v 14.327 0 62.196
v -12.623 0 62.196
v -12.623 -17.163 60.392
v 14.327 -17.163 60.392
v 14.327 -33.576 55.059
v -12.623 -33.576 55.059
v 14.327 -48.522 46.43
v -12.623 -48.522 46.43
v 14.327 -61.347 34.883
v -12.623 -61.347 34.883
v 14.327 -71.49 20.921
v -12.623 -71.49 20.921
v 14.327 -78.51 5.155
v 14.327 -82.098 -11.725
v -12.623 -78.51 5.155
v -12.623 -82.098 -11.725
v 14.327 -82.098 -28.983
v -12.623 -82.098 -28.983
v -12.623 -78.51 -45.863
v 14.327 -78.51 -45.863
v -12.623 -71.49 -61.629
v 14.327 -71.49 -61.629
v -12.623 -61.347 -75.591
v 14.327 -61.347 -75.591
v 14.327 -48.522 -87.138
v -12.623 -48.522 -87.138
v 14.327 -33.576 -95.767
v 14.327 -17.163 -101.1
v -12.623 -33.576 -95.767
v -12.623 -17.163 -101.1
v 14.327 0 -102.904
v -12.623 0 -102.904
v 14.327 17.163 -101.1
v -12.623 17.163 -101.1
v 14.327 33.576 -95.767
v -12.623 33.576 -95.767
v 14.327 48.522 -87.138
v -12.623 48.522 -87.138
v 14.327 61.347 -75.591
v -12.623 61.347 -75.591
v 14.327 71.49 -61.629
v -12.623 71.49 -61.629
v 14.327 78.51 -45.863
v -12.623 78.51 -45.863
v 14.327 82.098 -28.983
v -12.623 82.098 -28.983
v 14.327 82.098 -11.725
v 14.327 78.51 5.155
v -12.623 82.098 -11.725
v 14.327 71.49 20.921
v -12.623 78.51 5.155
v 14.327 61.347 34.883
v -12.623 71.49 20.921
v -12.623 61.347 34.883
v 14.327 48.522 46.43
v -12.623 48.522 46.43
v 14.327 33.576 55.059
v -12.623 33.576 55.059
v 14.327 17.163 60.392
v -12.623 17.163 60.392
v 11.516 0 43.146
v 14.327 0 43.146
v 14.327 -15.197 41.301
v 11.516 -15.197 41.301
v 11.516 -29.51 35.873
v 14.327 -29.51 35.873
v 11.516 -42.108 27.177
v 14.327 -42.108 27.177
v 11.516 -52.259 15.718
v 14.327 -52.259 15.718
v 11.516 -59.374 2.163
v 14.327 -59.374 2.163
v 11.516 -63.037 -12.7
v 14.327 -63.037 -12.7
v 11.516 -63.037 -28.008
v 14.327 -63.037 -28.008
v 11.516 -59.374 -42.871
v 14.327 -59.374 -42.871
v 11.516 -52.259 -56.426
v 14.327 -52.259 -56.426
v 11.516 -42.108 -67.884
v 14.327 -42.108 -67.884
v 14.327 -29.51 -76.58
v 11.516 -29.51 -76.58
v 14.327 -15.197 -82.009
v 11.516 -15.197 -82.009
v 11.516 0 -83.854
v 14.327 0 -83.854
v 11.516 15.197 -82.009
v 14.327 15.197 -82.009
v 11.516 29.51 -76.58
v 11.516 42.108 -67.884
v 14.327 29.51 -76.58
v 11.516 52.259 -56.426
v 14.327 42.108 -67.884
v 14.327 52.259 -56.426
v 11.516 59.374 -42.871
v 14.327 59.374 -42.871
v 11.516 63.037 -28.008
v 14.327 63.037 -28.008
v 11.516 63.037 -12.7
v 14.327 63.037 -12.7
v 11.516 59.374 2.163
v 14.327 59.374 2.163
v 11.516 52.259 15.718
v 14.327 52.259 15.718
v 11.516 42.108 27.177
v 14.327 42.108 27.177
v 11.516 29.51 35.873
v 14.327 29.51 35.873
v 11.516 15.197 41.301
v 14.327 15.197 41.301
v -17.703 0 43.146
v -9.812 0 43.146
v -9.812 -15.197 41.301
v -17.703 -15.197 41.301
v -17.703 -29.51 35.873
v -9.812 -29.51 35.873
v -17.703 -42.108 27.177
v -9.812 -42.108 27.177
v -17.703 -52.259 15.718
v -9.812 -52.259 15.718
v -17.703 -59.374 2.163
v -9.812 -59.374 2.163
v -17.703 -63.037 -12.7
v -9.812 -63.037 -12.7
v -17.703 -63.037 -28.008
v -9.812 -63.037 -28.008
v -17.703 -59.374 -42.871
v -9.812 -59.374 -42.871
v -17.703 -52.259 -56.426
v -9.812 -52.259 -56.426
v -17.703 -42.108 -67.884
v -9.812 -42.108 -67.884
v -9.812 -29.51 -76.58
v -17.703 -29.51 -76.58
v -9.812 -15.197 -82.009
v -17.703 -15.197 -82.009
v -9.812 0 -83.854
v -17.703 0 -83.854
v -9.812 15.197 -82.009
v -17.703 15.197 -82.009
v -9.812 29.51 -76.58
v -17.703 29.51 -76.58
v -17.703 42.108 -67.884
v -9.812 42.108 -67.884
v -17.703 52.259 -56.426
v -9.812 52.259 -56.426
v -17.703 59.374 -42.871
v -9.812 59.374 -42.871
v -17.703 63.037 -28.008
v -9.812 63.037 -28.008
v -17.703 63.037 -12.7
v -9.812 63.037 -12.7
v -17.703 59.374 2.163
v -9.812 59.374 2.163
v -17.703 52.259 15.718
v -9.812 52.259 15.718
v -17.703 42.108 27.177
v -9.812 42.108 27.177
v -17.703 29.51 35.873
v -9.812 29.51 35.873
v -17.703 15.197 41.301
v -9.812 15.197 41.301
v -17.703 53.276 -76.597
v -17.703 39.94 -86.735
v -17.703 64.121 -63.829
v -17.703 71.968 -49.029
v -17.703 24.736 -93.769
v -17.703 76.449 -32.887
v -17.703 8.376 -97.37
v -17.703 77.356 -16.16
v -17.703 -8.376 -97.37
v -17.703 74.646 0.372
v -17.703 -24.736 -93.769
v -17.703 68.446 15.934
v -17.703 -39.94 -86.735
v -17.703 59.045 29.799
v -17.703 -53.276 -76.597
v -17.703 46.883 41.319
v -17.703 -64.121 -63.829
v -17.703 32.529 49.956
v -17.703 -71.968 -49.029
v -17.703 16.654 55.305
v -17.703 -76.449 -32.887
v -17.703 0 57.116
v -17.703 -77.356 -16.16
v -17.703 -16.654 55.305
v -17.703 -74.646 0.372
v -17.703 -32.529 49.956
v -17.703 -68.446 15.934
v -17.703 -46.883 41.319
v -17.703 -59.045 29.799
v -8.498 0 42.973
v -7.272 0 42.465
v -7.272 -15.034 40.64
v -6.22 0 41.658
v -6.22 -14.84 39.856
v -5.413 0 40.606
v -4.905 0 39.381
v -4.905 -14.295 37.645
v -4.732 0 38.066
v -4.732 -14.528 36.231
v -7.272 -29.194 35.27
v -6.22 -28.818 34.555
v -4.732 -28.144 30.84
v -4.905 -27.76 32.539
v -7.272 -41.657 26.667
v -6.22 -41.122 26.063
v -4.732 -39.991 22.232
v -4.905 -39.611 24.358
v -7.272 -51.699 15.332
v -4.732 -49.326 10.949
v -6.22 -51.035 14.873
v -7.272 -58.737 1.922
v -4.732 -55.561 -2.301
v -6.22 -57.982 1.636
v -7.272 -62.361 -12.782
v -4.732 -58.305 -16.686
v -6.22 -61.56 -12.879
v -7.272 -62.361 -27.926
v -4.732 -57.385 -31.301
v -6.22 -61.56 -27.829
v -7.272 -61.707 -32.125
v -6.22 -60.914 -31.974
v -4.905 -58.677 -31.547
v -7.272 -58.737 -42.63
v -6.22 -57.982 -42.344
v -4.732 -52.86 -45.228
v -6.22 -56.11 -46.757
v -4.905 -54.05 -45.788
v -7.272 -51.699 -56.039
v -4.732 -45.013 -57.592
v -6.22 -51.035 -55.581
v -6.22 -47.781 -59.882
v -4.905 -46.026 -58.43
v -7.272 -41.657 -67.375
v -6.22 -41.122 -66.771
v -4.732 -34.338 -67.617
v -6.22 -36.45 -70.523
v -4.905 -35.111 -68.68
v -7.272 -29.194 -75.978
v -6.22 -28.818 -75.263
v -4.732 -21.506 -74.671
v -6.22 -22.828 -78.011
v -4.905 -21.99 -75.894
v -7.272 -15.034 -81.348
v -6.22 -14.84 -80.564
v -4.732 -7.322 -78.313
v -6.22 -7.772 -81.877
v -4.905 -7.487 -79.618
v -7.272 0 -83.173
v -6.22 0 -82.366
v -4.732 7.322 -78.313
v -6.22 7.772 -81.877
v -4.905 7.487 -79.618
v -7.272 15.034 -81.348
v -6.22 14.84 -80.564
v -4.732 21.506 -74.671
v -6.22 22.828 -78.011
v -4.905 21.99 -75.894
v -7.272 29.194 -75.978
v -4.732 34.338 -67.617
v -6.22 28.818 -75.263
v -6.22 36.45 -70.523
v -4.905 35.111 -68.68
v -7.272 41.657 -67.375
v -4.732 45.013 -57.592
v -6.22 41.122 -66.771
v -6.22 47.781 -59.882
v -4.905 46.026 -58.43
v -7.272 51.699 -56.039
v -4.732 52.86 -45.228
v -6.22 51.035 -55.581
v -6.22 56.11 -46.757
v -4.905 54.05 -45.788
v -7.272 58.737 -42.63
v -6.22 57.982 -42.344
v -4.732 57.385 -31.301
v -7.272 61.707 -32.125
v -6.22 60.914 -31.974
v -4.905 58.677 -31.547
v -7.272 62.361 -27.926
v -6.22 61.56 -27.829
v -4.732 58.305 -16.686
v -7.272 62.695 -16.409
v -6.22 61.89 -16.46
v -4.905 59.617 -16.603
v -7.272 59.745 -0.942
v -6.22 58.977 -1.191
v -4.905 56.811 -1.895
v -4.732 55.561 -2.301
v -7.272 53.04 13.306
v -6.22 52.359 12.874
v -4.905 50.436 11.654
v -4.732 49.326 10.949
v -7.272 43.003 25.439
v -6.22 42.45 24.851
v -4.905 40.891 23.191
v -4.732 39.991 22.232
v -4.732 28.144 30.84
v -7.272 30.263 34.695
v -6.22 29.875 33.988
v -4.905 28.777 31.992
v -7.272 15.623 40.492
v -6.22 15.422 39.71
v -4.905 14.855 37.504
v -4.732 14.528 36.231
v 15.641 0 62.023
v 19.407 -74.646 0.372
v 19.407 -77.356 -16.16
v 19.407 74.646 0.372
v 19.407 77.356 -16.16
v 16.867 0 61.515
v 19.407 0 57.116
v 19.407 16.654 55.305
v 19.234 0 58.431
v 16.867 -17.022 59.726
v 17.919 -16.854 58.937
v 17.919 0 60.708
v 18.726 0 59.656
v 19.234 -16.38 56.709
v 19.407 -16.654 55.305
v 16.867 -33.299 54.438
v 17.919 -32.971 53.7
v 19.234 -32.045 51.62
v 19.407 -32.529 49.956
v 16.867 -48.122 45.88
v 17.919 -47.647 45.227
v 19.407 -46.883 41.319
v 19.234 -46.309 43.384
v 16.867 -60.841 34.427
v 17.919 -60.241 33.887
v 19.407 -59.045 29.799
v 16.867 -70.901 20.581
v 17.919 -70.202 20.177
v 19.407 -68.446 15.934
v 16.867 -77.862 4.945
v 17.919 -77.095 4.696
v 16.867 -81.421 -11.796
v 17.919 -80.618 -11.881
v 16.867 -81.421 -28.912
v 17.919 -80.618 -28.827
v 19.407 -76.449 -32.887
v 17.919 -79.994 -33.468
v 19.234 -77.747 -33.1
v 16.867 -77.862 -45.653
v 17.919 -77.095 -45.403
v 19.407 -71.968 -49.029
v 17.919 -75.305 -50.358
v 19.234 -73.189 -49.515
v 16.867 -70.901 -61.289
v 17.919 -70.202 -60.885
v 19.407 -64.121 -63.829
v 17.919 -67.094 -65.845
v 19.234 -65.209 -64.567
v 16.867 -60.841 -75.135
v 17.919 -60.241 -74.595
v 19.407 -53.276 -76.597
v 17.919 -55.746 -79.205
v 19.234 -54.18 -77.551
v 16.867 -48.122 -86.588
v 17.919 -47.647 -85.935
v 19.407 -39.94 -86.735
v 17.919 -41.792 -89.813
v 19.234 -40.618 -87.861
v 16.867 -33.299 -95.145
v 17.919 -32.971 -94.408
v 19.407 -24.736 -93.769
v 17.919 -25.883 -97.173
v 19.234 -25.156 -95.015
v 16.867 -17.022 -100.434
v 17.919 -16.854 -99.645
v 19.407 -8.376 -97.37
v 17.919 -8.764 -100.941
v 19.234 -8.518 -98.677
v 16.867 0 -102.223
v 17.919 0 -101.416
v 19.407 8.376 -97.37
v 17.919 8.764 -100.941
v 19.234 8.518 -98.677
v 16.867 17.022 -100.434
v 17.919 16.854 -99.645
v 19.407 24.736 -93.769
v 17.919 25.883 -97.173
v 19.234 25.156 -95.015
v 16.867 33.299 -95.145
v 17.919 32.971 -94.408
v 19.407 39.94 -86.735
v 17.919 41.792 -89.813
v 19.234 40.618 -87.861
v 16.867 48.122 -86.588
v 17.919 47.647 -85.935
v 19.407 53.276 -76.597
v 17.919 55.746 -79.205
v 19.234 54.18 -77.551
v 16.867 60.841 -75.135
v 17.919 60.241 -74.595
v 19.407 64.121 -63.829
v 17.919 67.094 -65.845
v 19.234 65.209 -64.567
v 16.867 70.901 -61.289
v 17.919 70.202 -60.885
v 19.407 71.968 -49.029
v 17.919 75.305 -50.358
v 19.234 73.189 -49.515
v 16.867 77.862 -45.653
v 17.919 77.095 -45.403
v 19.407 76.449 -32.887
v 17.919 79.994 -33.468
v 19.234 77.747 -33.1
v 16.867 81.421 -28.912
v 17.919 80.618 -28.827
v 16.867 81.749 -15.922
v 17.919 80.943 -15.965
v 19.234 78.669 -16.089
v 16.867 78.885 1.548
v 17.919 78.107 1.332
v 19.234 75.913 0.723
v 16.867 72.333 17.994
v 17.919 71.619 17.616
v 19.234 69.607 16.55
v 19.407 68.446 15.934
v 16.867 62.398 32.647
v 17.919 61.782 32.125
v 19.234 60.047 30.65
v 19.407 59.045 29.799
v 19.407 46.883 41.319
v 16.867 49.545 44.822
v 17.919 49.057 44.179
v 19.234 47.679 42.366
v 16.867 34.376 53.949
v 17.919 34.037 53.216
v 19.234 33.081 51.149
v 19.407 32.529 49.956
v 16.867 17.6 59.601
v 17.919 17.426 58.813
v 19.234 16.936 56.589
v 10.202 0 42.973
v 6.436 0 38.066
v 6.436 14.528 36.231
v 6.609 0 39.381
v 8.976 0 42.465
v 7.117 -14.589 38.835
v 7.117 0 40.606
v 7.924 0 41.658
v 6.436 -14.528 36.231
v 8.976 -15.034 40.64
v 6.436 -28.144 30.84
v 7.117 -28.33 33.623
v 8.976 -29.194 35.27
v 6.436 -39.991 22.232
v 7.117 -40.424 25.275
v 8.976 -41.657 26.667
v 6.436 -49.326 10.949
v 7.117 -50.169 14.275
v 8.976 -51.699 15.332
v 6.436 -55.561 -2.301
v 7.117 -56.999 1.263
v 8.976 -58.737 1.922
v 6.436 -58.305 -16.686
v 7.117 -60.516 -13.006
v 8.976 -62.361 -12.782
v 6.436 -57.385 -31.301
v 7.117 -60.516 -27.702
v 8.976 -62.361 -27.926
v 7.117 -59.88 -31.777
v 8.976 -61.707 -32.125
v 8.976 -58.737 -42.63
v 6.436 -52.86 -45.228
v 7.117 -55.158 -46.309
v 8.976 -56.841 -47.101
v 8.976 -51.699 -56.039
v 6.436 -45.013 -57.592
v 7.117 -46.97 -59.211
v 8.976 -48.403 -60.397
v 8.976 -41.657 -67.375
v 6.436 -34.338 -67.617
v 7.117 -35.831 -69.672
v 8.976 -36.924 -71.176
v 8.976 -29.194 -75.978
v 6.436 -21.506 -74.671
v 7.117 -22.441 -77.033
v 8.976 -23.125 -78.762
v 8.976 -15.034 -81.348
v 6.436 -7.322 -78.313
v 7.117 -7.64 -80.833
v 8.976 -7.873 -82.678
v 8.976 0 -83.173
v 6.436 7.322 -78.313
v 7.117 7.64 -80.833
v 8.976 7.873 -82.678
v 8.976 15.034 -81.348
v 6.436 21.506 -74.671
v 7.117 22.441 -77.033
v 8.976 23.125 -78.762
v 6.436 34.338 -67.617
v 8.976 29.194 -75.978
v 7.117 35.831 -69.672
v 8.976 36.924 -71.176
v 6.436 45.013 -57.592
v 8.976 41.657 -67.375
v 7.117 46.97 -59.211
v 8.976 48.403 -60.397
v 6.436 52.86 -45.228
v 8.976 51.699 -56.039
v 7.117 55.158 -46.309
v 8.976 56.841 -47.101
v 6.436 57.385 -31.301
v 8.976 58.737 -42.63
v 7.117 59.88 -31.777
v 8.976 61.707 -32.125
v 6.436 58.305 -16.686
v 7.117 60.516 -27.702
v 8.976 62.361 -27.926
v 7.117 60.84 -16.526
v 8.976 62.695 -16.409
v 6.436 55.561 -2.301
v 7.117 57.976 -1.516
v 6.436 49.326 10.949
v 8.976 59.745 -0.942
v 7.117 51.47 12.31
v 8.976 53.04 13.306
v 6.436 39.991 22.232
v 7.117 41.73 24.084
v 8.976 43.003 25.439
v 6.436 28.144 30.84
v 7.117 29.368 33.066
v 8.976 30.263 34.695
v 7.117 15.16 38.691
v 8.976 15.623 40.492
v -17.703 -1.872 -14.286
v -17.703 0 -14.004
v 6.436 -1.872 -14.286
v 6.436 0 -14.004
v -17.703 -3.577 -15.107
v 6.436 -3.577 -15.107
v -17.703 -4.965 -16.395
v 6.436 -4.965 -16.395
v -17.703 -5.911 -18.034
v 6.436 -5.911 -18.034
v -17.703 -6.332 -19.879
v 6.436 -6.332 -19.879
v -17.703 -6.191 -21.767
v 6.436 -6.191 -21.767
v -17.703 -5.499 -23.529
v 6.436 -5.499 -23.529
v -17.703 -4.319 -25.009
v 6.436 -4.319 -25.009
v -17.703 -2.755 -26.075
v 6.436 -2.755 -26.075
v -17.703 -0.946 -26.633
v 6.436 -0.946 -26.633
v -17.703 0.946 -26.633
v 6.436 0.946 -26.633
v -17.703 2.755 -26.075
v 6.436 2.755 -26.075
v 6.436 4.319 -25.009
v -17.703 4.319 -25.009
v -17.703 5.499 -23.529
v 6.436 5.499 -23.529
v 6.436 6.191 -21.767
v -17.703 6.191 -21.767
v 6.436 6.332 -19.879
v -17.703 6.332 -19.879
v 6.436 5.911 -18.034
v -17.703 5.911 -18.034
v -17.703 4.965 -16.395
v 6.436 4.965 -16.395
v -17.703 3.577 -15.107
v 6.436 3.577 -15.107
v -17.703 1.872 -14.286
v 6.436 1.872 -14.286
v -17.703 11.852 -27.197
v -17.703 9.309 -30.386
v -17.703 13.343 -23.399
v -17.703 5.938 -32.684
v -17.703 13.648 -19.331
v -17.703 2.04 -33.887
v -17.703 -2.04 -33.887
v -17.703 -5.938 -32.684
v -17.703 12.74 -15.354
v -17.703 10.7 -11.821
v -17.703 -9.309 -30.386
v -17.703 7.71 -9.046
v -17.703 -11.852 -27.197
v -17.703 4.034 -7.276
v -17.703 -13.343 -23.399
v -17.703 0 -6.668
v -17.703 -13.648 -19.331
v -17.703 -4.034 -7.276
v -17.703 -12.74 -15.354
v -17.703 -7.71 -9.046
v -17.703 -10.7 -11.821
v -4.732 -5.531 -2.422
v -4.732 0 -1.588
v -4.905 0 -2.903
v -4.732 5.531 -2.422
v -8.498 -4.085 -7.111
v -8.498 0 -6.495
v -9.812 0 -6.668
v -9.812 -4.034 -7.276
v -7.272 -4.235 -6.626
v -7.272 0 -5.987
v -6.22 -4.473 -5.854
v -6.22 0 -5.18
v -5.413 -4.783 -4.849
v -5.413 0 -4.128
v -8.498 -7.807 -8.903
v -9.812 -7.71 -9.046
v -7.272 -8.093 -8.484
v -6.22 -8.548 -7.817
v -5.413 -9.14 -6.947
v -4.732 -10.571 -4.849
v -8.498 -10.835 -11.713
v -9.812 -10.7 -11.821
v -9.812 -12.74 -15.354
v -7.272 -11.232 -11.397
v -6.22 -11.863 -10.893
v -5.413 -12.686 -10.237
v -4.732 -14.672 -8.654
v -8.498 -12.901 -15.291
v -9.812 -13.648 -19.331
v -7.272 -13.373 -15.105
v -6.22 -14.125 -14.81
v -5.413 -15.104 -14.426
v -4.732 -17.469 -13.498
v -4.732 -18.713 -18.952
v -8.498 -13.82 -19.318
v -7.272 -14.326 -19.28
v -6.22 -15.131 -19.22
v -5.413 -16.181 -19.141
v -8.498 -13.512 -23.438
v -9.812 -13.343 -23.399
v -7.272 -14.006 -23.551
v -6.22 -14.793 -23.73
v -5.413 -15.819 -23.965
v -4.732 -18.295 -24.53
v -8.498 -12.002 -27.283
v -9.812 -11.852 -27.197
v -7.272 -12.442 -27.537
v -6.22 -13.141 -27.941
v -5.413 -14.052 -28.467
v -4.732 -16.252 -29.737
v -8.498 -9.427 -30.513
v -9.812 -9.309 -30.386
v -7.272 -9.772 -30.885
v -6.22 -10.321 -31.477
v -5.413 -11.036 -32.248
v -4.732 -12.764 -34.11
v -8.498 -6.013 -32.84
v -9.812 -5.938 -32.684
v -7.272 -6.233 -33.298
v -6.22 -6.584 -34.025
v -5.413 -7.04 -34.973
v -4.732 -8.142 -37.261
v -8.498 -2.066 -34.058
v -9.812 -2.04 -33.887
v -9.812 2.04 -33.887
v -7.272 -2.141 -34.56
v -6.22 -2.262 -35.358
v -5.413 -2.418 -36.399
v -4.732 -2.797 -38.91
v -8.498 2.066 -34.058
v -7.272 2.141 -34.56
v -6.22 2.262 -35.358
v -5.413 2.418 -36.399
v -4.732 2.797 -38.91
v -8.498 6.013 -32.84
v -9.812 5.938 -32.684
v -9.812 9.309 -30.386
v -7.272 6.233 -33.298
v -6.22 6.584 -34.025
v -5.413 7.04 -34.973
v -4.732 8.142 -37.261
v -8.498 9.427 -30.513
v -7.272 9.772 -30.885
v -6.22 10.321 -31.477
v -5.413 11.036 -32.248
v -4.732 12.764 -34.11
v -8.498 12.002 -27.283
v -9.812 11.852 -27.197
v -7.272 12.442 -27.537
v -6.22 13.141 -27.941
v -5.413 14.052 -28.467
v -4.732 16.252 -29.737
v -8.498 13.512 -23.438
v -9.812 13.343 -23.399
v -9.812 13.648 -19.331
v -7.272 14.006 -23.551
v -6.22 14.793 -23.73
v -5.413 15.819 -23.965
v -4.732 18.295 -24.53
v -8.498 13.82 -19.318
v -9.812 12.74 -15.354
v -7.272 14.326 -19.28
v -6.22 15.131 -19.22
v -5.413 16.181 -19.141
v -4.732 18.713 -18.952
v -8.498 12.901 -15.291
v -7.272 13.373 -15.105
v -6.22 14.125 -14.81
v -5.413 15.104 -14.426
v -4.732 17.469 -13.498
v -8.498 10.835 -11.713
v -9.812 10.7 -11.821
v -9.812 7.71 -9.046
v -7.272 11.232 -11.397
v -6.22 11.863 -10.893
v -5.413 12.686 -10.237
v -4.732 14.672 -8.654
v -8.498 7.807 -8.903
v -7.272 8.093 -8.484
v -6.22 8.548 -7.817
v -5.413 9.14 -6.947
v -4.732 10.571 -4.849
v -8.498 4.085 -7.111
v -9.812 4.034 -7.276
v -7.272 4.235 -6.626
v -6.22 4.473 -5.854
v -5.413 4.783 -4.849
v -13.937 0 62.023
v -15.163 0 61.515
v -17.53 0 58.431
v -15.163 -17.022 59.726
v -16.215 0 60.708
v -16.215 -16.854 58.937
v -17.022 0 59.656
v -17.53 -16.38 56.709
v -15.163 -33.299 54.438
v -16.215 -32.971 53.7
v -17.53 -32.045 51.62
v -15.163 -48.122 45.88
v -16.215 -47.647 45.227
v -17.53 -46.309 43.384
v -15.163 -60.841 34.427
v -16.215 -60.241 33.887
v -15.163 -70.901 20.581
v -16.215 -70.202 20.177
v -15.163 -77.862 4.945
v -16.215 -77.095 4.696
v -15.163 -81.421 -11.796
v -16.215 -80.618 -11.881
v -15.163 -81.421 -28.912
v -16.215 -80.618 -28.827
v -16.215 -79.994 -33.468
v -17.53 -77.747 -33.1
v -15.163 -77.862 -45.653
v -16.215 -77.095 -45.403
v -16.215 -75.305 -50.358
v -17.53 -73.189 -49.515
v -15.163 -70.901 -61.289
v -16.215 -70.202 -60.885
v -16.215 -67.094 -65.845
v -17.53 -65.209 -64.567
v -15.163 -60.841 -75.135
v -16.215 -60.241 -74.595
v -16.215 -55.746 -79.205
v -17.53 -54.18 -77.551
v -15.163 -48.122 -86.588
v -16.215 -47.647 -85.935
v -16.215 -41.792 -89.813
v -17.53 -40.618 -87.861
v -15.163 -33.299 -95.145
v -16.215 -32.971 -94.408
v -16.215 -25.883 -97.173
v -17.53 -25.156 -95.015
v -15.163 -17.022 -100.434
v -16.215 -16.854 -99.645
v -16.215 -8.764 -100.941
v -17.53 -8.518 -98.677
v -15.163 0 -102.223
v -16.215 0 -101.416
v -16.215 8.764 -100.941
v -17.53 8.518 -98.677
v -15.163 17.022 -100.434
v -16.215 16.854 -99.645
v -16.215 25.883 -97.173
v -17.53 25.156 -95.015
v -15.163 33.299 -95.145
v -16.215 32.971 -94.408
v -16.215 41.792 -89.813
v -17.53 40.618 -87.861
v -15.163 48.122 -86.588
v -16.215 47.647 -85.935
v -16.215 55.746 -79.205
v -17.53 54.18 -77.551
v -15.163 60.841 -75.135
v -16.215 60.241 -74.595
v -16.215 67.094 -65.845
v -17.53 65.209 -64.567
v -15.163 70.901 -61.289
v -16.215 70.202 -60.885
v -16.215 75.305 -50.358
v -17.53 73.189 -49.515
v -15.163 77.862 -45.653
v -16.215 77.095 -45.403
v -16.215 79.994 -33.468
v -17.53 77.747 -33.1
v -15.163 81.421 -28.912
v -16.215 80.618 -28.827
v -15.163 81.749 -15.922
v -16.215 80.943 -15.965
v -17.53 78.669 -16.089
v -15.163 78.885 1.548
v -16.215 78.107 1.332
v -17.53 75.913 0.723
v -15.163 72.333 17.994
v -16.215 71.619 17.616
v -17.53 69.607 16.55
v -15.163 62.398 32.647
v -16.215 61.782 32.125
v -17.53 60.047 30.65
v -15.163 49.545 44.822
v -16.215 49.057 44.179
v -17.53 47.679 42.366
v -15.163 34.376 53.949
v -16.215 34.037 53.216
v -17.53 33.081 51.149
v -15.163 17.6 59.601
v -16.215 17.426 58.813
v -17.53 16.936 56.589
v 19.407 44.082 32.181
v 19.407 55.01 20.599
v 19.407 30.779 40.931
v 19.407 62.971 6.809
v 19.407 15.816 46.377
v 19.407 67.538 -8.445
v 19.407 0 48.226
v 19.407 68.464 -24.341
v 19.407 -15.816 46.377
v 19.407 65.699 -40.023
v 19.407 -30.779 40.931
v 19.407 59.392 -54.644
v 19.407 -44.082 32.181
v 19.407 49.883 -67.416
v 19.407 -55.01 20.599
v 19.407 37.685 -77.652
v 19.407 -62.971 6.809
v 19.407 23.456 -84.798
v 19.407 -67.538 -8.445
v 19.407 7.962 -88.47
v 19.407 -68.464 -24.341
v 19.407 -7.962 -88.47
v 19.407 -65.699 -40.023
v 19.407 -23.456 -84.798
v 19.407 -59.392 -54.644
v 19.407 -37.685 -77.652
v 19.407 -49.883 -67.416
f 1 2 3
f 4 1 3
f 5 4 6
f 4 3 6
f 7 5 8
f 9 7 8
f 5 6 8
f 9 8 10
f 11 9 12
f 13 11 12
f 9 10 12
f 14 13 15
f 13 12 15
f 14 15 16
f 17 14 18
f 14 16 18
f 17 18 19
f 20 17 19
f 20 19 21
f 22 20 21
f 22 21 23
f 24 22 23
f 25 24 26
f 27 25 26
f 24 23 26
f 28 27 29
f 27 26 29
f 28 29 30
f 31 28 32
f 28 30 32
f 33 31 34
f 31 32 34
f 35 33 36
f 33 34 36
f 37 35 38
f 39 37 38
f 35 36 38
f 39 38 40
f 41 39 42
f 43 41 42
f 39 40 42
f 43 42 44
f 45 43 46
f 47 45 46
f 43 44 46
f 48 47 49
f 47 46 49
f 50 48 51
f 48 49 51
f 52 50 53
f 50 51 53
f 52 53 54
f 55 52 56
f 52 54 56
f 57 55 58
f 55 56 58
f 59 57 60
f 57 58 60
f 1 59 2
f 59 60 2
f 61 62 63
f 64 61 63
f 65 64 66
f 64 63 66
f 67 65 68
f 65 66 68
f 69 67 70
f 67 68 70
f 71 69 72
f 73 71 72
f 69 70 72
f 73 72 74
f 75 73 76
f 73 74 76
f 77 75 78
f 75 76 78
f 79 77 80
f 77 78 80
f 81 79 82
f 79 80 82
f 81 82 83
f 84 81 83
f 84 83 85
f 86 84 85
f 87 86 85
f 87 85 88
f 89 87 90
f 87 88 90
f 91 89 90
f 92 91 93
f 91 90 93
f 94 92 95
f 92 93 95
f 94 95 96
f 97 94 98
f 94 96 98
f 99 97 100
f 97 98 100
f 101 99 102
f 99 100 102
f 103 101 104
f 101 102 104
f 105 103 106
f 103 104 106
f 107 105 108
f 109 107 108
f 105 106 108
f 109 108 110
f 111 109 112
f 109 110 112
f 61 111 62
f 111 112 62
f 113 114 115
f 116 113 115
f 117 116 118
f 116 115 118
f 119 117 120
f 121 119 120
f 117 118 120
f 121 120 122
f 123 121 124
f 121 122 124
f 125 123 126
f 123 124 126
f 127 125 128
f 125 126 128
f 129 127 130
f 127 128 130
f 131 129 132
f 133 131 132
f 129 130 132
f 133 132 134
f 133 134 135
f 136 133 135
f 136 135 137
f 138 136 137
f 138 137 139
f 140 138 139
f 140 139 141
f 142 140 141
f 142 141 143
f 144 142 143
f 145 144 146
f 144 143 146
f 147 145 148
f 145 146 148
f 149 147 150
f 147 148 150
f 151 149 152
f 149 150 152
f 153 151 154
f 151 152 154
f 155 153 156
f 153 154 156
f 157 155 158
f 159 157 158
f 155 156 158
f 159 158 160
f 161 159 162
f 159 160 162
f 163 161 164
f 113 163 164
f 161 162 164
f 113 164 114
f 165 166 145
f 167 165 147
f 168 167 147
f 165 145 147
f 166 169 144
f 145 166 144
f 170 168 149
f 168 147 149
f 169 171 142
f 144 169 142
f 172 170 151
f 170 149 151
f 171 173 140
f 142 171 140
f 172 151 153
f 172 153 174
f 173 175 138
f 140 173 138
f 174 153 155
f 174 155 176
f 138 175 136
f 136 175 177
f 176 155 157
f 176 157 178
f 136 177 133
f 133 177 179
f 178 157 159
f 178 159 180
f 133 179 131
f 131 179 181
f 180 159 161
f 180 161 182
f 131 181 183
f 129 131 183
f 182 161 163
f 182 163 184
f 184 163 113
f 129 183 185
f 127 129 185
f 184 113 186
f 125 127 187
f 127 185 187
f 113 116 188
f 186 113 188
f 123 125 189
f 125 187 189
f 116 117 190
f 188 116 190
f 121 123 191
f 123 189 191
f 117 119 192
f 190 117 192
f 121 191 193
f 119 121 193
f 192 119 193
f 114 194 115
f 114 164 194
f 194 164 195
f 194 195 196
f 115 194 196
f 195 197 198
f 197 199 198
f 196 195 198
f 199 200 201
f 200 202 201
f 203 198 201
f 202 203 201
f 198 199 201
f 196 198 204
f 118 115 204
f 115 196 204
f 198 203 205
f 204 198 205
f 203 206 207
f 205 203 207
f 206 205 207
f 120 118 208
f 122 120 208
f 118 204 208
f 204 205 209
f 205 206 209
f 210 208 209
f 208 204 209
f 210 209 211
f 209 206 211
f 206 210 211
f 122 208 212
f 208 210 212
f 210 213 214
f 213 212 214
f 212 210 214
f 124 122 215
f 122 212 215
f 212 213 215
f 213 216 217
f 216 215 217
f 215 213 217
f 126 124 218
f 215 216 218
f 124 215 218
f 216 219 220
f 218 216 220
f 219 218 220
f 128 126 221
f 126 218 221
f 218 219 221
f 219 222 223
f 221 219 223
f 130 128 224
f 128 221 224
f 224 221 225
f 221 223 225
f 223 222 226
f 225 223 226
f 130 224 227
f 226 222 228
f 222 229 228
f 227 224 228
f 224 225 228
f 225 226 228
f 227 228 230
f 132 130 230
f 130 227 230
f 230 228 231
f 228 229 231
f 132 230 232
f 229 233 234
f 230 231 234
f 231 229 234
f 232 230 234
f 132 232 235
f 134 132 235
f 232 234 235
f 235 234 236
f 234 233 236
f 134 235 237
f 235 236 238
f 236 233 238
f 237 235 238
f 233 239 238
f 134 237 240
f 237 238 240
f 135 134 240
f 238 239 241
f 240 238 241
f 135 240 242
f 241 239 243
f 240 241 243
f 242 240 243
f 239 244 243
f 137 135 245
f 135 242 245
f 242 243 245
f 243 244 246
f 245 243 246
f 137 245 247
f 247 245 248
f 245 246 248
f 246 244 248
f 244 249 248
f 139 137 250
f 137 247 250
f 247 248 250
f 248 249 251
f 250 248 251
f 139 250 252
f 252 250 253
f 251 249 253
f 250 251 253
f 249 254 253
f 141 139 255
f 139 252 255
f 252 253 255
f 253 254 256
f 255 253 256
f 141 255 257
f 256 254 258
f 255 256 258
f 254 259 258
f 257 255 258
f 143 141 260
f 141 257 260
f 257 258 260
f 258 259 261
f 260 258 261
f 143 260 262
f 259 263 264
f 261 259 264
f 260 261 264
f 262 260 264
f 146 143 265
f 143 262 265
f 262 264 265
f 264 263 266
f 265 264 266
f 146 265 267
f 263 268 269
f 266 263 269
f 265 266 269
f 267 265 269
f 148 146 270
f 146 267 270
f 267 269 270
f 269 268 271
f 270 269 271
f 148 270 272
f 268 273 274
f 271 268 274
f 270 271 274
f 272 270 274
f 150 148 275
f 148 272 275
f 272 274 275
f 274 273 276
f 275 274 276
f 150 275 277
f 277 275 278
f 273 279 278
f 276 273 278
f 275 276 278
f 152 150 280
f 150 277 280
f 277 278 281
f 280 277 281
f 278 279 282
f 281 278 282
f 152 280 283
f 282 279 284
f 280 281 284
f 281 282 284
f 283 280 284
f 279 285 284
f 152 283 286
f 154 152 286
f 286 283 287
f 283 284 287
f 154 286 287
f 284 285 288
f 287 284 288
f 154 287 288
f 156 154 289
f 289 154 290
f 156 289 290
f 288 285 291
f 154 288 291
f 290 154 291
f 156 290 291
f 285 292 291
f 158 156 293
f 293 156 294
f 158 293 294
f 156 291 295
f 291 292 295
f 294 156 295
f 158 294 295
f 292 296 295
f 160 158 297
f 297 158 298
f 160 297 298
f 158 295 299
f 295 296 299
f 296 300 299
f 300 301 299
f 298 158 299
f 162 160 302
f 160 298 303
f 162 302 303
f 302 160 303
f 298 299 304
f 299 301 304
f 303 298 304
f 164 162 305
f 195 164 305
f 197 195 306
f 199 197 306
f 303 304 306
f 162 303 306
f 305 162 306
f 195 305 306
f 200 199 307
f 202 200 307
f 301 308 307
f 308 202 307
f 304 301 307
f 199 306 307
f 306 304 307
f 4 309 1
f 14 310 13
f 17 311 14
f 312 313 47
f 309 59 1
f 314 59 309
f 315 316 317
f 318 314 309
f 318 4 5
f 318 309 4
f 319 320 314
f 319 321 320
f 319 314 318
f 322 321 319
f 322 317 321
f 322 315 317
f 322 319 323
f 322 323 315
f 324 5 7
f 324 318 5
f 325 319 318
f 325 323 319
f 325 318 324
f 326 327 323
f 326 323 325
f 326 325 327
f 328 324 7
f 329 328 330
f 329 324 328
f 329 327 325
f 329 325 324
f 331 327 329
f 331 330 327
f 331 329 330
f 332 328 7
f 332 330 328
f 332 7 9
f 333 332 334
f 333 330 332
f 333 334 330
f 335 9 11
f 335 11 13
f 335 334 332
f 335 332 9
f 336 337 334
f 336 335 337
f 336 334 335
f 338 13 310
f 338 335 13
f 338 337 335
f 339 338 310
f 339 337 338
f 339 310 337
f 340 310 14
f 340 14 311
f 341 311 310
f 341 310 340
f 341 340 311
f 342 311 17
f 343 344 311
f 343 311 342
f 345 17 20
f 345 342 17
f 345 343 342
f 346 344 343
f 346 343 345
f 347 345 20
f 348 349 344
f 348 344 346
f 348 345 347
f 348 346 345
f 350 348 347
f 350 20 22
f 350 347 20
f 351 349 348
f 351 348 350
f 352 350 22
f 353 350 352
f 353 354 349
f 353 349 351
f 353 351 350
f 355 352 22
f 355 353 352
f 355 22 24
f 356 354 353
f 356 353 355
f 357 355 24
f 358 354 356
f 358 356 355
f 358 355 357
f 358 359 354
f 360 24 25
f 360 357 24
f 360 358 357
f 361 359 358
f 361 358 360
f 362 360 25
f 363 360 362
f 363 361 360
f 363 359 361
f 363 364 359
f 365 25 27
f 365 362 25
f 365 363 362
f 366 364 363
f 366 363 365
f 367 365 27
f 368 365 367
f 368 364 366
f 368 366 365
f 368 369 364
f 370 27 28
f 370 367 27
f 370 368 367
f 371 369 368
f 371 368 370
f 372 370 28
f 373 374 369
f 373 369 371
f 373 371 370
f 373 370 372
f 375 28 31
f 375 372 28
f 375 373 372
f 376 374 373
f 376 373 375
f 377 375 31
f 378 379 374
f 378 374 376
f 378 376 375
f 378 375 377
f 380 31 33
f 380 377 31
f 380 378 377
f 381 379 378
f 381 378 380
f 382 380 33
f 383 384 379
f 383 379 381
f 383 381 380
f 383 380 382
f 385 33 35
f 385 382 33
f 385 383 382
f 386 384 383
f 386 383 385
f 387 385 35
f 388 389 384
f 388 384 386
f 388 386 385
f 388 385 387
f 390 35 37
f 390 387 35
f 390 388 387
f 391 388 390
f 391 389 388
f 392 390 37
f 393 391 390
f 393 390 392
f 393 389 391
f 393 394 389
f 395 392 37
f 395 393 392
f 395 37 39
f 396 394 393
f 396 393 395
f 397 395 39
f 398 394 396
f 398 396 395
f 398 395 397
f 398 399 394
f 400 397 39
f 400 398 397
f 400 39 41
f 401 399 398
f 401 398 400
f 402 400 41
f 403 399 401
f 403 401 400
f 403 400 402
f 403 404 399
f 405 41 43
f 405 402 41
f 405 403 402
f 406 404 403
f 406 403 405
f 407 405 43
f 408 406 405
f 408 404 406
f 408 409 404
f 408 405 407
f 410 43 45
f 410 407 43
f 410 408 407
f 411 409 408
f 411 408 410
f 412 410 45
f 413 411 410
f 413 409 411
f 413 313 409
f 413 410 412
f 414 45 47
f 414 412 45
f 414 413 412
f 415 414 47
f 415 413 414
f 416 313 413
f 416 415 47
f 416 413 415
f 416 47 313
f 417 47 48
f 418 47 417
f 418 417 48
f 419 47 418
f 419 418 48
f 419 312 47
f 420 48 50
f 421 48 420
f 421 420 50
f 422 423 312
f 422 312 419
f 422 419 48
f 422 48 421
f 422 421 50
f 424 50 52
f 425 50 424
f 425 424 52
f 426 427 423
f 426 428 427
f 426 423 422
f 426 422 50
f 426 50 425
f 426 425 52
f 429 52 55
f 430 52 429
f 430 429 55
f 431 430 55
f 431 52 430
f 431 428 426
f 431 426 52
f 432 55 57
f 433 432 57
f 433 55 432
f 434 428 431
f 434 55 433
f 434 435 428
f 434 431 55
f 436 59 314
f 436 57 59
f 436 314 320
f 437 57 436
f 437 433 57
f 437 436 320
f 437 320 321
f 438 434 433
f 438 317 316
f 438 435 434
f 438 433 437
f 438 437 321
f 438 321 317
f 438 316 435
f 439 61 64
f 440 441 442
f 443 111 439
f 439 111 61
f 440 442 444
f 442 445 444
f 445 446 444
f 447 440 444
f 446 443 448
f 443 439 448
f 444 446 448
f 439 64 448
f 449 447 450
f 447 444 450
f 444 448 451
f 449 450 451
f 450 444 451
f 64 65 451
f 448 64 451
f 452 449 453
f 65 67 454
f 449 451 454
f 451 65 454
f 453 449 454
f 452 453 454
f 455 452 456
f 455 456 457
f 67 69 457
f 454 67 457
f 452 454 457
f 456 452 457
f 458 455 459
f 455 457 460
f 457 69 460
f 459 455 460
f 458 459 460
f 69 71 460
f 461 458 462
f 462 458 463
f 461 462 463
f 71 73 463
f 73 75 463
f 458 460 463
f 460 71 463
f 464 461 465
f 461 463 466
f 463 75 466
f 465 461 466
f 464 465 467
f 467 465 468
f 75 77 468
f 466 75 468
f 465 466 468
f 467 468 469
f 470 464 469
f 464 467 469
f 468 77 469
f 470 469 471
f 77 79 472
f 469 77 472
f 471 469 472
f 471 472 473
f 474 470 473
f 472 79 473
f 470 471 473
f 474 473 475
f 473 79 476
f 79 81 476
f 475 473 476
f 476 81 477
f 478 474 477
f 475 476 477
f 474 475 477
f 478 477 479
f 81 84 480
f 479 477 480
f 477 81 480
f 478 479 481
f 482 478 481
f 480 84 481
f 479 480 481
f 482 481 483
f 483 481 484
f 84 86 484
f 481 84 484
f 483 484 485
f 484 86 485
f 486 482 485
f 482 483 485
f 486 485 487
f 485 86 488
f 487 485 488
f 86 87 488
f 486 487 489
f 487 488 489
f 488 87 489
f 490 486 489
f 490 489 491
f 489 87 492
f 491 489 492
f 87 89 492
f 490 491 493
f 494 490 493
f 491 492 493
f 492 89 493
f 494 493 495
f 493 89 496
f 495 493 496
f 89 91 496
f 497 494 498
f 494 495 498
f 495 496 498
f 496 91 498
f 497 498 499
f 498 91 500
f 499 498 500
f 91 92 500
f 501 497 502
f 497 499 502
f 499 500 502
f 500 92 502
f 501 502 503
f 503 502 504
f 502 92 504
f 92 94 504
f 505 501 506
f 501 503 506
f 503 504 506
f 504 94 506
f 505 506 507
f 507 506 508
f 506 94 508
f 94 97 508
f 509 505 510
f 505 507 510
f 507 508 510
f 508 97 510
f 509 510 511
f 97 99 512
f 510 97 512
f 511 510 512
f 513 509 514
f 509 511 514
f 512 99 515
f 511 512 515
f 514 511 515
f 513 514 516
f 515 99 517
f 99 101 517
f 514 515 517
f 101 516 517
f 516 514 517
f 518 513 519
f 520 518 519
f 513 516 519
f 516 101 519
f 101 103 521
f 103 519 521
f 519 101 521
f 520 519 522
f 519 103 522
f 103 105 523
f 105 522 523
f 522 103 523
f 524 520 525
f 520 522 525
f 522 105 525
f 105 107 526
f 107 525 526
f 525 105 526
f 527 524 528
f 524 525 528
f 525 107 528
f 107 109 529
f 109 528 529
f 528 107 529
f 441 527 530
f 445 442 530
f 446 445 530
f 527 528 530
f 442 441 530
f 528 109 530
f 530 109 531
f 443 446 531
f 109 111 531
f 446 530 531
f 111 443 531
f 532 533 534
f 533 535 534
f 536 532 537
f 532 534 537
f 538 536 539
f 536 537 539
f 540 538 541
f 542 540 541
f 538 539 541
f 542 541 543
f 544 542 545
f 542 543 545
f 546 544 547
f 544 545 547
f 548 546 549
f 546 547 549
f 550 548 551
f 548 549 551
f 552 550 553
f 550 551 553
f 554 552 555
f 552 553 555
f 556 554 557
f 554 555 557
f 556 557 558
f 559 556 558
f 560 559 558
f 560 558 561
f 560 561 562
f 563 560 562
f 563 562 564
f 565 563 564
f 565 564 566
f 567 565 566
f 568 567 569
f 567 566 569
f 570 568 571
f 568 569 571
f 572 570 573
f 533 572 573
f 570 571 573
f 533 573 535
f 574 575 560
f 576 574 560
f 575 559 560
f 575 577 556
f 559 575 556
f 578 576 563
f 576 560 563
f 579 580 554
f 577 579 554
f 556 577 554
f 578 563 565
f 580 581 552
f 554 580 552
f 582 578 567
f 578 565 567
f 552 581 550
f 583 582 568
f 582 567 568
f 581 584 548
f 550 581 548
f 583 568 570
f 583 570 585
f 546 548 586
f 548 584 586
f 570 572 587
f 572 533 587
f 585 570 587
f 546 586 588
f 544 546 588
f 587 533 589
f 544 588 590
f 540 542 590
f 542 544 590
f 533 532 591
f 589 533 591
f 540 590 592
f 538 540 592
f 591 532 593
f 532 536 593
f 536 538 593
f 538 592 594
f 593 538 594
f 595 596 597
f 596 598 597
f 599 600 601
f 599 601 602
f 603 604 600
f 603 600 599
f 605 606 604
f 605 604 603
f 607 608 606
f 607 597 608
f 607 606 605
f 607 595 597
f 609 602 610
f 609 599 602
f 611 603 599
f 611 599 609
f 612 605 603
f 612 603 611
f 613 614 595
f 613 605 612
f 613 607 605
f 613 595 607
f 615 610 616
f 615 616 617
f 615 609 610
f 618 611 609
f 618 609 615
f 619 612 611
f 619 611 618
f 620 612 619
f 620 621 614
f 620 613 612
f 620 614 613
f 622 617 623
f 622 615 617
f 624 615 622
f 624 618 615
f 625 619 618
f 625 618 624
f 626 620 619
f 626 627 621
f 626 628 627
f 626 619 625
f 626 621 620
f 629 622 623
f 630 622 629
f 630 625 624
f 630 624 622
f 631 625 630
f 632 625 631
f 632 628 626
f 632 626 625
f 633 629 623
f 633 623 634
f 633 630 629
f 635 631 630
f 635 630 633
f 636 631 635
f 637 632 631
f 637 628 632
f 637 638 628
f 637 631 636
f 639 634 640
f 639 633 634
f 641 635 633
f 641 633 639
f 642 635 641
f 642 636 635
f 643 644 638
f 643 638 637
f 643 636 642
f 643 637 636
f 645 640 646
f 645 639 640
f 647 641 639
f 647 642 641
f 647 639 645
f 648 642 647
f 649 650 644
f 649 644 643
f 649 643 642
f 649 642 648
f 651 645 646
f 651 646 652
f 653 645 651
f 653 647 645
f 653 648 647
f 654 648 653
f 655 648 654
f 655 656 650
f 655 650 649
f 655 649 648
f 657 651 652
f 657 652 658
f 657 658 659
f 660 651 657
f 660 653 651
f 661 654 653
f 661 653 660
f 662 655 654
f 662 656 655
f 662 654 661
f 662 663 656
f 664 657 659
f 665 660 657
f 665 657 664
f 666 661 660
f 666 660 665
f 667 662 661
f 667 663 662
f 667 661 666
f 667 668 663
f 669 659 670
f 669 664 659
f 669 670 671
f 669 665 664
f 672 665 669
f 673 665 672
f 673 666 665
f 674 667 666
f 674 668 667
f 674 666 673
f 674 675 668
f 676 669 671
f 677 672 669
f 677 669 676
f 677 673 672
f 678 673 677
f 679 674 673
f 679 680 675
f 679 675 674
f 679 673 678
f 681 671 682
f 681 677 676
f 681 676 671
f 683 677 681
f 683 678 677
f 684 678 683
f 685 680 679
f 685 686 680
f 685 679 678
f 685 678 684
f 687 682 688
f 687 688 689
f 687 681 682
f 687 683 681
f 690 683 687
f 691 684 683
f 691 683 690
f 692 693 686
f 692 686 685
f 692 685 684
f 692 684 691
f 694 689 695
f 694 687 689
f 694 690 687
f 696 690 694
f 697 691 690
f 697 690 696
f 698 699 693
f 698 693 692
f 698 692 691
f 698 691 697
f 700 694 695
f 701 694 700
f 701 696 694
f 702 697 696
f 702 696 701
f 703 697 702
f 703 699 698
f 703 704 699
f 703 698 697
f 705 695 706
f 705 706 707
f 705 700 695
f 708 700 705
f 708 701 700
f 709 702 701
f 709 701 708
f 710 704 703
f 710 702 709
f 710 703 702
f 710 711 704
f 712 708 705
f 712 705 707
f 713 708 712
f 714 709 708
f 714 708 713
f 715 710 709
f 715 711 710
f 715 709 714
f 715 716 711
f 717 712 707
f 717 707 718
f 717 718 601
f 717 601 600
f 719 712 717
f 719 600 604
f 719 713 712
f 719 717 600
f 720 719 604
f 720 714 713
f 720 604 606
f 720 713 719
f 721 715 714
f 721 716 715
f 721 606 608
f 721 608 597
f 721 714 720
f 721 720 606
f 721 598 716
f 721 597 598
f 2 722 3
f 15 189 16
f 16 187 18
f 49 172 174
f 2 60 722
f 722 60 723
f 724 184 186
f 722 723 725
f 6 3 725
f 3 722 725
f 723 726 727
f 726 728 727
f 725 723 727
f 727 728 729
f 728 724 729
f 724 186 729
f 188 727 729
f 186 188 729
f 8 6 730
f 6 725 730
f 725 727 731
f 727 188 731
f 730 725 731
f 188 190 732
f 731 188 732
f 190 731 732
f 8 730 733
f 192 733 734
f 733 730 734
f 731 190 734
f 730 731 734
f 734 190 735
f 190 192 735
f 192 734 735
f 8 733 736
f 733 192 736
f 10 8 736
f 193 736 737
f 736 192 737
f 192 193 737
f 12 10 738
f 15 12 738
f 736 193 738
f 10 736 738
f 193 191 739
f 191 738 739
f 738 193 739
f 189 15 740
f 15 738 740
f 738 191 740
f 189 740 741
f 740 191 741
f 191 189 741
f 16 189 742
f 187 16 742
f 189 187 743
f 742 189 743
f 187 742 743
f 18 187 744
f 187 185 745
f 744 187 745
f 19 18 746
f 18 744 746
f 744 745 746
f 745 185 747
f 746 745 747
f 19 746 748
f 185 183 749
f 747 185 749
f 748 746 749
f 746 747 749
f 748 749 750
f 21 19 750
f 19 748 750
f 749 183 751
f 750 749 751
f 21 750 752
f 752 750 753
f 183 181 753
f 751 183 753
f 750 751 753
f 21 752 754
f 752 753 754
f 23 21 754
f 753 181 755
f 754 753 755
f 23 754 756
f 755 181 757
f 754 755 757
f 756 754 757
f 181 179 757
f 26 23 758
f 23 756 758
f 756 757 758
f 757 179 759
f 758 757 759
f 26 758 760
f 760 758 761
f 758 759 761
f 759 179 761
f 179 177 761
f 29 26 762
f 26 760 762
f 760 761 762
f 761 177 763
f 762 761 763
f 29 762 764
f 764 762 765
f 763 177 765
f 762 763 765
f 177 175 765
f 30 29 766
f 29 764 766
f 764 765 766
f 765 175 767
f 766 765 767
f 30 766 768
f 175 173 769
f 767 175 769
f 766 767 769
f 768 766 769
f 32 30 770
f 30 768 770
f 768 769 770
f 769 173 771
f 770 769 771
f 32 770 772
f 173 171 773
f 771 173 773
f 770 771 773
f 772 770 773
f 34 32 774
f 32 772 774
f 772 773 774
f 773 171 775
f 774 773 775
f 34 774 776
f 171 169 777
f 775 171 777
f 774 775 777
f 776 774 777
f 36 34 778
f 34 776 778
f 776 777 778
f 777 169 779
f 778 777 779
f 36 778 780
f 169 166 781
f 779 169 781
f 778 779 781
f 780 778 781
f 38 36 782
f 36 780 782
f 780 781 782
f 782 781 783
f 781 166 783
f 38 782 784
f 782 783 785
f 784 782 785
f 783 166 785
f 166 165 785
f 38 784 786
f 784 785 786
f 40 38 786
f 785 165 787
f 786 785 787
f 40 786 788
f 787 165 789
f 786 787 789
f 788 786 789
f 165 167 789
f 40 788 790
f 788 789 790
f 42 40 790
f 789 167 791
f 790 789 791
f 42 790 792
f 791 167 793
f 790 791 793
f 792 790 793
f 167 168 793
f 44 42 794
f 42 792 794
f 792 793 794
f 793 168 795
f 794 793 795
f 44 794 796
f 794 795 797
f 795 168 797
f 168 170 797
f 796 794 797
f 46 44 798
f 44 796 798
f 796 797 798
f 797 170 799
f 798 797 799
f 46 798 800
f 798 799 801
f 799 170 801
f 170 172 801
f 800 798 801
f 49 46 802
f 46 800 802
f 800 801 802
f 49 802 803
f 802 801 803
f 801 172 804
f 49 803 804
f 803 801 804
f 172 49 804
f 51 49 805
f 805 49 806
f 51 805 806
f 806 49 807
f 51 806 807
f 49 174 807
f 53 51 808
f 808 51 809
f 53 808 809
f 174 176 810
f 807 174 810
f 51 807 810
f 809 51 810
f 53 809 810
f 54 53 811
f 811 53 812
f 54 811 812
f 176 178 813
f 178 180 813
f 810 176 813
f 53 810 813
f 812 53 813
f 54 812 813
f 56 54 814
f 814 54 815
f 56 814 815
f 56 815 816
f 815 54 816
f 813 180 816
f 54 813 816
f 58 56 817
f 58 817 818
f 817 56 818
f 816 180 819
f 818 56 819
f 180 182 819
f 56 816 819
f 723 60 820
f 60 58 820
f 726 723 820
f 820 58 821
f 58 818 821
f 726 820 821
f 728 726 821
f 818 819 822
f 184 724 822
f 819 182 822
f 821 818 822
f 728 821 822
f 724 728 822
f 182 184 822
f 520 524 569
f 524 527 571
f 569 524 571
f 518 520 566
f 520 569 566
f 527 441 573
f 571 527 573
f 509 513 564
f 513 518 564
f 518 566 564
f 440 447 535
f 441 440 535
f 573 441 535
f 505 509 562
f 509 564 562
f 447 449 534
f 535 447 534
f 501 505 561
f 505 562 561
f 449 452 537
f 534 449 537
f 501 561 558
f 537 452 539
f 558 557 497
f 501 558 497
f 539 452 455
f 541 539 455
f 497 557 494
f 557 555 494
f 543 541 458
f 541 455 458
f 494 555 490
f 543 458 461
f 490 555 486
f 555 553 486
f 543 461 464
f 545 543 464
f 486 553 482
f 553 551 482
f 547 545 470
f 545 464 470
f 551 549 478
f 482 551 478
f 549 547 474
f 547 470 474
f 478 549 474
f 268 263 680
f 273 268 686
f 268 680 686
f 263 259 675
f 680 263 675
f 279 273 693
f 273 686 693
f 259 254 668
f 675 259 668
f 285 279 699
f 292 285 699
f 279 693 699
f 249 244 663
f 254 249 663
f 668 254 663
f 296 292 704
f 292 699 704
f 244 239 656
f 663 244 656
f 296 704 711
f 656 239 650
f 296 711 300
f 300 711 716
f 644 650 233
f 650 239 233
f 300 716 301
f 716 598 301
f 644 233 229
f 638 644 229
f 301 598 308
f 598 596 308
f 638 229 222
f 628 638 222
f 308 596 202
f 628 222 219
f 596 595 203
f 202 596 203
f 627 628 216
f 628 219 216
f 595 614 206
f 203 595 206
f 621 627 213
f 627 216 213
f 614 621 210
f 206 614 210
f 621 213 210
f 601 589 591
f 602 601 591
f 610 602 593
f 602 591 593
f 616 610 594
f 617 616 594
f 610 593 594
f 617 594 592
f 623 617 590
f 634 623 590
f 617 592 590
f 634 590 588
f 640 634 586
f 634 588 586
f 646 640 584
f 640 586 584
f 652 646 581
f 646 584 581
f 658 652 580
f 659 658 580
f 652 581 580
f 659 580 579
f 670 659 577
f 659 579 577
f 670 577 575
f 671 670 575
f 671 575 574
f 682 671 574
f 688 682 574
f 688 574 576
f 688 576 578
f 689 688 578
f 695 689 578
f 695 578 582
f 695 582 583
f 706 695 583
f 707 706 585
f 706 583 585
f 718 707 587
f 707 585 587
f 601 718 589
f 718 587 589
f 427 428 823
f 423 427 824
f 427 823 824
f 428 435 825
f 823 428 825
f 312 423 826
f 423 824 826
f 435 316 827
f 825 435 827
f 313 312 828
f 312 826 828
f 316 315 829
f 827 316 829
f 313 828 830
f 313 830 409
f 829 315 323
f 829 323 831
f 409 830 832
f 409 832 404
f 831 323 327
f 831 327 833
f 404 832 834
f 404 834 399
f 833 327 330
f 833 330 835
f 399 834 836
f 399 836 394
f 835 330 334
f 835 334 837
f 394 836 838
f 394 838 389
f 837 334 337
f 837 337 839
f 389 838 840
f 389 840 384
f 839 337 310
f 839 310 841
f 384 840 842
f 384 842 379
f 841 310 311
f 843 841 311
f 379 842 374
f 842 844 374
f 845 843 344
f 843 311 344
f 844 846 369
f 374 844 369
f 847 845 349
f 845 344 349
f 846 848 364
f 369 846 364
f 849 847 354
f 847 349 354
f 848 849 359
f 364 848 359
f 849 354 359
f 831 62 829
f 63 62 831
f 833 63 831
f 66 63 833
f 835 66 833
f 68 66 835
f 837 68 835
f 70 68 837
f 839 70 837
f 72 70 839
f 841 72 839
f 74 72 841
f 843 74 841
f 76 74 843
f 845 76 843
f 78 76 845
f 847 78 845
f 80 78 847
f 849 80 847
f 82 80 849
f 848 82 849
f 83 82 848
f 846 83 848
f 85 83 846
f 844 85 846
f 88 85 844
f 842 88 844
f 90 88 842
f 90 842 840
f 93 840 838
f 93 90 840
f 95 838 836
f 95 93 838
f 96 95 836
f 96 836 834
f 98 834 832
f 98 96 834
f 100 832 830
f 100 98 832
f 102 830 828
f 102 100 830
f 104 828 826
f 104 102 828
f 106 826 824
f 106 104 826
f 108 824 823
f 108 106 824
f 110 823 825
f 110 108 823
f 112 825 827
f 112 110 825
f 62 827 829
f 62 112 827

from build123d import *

# Parameters (mm, degrees)
F2_R    = 5.08
F3_SIZE = 5.08
F4_R    = 5.08


with BuildPart() as f1:
    # F0 (on Front) → F1 (revolve)
    with BuildSketch(Plane.XZ):
        Polygon((19.406605757, 62.1960816438), (-17.702616065, 62.1960816438), (-17.702616065, 43.1460816438), (-4.7324024234, 43.1460816438), (-4.7324024234, -6.6680153832), (-17.702616065, -6.6680153832), (-17.702616065, -14.0039183562), (-4.7324024234, -14.0039183562), (6.4363921154, -14.0039183562), (6.4363921154, 43.1460816438), (19.406605757, 43.1460816438), align=None)
    revolve(axis=Axis((6.8320201244, 0, -20.3539183562), (1, 0, 0)))

    # F2
    f2_edges = [f1.edges().sort_by_distance(p)[0] for p in [
        (-4.732402, 0, -83.853918),
        (6.436392, 0, -83.853918),
        (19.406606, 0, -102.903918),
        (-17.702616, 0, -102.903918),
    ]]
    fillet(f2_edges, radius=F2_R)

    # F3
    f3_edges = [f1.edges().sort_by_distance(p)[0] for p in [
        (19.406606, 0, -83.853918),
    ]]
    chamfer(f3_edges, length=F3_SIZE)

    # F4
    f4_edges = [f1.edges().sort_by_distance(p)[0] for p in [
        (-4.732402, 0, -34.039821),
    ]]
    fillet(f4_edges, radius=F4_R)


solid = f1.part
